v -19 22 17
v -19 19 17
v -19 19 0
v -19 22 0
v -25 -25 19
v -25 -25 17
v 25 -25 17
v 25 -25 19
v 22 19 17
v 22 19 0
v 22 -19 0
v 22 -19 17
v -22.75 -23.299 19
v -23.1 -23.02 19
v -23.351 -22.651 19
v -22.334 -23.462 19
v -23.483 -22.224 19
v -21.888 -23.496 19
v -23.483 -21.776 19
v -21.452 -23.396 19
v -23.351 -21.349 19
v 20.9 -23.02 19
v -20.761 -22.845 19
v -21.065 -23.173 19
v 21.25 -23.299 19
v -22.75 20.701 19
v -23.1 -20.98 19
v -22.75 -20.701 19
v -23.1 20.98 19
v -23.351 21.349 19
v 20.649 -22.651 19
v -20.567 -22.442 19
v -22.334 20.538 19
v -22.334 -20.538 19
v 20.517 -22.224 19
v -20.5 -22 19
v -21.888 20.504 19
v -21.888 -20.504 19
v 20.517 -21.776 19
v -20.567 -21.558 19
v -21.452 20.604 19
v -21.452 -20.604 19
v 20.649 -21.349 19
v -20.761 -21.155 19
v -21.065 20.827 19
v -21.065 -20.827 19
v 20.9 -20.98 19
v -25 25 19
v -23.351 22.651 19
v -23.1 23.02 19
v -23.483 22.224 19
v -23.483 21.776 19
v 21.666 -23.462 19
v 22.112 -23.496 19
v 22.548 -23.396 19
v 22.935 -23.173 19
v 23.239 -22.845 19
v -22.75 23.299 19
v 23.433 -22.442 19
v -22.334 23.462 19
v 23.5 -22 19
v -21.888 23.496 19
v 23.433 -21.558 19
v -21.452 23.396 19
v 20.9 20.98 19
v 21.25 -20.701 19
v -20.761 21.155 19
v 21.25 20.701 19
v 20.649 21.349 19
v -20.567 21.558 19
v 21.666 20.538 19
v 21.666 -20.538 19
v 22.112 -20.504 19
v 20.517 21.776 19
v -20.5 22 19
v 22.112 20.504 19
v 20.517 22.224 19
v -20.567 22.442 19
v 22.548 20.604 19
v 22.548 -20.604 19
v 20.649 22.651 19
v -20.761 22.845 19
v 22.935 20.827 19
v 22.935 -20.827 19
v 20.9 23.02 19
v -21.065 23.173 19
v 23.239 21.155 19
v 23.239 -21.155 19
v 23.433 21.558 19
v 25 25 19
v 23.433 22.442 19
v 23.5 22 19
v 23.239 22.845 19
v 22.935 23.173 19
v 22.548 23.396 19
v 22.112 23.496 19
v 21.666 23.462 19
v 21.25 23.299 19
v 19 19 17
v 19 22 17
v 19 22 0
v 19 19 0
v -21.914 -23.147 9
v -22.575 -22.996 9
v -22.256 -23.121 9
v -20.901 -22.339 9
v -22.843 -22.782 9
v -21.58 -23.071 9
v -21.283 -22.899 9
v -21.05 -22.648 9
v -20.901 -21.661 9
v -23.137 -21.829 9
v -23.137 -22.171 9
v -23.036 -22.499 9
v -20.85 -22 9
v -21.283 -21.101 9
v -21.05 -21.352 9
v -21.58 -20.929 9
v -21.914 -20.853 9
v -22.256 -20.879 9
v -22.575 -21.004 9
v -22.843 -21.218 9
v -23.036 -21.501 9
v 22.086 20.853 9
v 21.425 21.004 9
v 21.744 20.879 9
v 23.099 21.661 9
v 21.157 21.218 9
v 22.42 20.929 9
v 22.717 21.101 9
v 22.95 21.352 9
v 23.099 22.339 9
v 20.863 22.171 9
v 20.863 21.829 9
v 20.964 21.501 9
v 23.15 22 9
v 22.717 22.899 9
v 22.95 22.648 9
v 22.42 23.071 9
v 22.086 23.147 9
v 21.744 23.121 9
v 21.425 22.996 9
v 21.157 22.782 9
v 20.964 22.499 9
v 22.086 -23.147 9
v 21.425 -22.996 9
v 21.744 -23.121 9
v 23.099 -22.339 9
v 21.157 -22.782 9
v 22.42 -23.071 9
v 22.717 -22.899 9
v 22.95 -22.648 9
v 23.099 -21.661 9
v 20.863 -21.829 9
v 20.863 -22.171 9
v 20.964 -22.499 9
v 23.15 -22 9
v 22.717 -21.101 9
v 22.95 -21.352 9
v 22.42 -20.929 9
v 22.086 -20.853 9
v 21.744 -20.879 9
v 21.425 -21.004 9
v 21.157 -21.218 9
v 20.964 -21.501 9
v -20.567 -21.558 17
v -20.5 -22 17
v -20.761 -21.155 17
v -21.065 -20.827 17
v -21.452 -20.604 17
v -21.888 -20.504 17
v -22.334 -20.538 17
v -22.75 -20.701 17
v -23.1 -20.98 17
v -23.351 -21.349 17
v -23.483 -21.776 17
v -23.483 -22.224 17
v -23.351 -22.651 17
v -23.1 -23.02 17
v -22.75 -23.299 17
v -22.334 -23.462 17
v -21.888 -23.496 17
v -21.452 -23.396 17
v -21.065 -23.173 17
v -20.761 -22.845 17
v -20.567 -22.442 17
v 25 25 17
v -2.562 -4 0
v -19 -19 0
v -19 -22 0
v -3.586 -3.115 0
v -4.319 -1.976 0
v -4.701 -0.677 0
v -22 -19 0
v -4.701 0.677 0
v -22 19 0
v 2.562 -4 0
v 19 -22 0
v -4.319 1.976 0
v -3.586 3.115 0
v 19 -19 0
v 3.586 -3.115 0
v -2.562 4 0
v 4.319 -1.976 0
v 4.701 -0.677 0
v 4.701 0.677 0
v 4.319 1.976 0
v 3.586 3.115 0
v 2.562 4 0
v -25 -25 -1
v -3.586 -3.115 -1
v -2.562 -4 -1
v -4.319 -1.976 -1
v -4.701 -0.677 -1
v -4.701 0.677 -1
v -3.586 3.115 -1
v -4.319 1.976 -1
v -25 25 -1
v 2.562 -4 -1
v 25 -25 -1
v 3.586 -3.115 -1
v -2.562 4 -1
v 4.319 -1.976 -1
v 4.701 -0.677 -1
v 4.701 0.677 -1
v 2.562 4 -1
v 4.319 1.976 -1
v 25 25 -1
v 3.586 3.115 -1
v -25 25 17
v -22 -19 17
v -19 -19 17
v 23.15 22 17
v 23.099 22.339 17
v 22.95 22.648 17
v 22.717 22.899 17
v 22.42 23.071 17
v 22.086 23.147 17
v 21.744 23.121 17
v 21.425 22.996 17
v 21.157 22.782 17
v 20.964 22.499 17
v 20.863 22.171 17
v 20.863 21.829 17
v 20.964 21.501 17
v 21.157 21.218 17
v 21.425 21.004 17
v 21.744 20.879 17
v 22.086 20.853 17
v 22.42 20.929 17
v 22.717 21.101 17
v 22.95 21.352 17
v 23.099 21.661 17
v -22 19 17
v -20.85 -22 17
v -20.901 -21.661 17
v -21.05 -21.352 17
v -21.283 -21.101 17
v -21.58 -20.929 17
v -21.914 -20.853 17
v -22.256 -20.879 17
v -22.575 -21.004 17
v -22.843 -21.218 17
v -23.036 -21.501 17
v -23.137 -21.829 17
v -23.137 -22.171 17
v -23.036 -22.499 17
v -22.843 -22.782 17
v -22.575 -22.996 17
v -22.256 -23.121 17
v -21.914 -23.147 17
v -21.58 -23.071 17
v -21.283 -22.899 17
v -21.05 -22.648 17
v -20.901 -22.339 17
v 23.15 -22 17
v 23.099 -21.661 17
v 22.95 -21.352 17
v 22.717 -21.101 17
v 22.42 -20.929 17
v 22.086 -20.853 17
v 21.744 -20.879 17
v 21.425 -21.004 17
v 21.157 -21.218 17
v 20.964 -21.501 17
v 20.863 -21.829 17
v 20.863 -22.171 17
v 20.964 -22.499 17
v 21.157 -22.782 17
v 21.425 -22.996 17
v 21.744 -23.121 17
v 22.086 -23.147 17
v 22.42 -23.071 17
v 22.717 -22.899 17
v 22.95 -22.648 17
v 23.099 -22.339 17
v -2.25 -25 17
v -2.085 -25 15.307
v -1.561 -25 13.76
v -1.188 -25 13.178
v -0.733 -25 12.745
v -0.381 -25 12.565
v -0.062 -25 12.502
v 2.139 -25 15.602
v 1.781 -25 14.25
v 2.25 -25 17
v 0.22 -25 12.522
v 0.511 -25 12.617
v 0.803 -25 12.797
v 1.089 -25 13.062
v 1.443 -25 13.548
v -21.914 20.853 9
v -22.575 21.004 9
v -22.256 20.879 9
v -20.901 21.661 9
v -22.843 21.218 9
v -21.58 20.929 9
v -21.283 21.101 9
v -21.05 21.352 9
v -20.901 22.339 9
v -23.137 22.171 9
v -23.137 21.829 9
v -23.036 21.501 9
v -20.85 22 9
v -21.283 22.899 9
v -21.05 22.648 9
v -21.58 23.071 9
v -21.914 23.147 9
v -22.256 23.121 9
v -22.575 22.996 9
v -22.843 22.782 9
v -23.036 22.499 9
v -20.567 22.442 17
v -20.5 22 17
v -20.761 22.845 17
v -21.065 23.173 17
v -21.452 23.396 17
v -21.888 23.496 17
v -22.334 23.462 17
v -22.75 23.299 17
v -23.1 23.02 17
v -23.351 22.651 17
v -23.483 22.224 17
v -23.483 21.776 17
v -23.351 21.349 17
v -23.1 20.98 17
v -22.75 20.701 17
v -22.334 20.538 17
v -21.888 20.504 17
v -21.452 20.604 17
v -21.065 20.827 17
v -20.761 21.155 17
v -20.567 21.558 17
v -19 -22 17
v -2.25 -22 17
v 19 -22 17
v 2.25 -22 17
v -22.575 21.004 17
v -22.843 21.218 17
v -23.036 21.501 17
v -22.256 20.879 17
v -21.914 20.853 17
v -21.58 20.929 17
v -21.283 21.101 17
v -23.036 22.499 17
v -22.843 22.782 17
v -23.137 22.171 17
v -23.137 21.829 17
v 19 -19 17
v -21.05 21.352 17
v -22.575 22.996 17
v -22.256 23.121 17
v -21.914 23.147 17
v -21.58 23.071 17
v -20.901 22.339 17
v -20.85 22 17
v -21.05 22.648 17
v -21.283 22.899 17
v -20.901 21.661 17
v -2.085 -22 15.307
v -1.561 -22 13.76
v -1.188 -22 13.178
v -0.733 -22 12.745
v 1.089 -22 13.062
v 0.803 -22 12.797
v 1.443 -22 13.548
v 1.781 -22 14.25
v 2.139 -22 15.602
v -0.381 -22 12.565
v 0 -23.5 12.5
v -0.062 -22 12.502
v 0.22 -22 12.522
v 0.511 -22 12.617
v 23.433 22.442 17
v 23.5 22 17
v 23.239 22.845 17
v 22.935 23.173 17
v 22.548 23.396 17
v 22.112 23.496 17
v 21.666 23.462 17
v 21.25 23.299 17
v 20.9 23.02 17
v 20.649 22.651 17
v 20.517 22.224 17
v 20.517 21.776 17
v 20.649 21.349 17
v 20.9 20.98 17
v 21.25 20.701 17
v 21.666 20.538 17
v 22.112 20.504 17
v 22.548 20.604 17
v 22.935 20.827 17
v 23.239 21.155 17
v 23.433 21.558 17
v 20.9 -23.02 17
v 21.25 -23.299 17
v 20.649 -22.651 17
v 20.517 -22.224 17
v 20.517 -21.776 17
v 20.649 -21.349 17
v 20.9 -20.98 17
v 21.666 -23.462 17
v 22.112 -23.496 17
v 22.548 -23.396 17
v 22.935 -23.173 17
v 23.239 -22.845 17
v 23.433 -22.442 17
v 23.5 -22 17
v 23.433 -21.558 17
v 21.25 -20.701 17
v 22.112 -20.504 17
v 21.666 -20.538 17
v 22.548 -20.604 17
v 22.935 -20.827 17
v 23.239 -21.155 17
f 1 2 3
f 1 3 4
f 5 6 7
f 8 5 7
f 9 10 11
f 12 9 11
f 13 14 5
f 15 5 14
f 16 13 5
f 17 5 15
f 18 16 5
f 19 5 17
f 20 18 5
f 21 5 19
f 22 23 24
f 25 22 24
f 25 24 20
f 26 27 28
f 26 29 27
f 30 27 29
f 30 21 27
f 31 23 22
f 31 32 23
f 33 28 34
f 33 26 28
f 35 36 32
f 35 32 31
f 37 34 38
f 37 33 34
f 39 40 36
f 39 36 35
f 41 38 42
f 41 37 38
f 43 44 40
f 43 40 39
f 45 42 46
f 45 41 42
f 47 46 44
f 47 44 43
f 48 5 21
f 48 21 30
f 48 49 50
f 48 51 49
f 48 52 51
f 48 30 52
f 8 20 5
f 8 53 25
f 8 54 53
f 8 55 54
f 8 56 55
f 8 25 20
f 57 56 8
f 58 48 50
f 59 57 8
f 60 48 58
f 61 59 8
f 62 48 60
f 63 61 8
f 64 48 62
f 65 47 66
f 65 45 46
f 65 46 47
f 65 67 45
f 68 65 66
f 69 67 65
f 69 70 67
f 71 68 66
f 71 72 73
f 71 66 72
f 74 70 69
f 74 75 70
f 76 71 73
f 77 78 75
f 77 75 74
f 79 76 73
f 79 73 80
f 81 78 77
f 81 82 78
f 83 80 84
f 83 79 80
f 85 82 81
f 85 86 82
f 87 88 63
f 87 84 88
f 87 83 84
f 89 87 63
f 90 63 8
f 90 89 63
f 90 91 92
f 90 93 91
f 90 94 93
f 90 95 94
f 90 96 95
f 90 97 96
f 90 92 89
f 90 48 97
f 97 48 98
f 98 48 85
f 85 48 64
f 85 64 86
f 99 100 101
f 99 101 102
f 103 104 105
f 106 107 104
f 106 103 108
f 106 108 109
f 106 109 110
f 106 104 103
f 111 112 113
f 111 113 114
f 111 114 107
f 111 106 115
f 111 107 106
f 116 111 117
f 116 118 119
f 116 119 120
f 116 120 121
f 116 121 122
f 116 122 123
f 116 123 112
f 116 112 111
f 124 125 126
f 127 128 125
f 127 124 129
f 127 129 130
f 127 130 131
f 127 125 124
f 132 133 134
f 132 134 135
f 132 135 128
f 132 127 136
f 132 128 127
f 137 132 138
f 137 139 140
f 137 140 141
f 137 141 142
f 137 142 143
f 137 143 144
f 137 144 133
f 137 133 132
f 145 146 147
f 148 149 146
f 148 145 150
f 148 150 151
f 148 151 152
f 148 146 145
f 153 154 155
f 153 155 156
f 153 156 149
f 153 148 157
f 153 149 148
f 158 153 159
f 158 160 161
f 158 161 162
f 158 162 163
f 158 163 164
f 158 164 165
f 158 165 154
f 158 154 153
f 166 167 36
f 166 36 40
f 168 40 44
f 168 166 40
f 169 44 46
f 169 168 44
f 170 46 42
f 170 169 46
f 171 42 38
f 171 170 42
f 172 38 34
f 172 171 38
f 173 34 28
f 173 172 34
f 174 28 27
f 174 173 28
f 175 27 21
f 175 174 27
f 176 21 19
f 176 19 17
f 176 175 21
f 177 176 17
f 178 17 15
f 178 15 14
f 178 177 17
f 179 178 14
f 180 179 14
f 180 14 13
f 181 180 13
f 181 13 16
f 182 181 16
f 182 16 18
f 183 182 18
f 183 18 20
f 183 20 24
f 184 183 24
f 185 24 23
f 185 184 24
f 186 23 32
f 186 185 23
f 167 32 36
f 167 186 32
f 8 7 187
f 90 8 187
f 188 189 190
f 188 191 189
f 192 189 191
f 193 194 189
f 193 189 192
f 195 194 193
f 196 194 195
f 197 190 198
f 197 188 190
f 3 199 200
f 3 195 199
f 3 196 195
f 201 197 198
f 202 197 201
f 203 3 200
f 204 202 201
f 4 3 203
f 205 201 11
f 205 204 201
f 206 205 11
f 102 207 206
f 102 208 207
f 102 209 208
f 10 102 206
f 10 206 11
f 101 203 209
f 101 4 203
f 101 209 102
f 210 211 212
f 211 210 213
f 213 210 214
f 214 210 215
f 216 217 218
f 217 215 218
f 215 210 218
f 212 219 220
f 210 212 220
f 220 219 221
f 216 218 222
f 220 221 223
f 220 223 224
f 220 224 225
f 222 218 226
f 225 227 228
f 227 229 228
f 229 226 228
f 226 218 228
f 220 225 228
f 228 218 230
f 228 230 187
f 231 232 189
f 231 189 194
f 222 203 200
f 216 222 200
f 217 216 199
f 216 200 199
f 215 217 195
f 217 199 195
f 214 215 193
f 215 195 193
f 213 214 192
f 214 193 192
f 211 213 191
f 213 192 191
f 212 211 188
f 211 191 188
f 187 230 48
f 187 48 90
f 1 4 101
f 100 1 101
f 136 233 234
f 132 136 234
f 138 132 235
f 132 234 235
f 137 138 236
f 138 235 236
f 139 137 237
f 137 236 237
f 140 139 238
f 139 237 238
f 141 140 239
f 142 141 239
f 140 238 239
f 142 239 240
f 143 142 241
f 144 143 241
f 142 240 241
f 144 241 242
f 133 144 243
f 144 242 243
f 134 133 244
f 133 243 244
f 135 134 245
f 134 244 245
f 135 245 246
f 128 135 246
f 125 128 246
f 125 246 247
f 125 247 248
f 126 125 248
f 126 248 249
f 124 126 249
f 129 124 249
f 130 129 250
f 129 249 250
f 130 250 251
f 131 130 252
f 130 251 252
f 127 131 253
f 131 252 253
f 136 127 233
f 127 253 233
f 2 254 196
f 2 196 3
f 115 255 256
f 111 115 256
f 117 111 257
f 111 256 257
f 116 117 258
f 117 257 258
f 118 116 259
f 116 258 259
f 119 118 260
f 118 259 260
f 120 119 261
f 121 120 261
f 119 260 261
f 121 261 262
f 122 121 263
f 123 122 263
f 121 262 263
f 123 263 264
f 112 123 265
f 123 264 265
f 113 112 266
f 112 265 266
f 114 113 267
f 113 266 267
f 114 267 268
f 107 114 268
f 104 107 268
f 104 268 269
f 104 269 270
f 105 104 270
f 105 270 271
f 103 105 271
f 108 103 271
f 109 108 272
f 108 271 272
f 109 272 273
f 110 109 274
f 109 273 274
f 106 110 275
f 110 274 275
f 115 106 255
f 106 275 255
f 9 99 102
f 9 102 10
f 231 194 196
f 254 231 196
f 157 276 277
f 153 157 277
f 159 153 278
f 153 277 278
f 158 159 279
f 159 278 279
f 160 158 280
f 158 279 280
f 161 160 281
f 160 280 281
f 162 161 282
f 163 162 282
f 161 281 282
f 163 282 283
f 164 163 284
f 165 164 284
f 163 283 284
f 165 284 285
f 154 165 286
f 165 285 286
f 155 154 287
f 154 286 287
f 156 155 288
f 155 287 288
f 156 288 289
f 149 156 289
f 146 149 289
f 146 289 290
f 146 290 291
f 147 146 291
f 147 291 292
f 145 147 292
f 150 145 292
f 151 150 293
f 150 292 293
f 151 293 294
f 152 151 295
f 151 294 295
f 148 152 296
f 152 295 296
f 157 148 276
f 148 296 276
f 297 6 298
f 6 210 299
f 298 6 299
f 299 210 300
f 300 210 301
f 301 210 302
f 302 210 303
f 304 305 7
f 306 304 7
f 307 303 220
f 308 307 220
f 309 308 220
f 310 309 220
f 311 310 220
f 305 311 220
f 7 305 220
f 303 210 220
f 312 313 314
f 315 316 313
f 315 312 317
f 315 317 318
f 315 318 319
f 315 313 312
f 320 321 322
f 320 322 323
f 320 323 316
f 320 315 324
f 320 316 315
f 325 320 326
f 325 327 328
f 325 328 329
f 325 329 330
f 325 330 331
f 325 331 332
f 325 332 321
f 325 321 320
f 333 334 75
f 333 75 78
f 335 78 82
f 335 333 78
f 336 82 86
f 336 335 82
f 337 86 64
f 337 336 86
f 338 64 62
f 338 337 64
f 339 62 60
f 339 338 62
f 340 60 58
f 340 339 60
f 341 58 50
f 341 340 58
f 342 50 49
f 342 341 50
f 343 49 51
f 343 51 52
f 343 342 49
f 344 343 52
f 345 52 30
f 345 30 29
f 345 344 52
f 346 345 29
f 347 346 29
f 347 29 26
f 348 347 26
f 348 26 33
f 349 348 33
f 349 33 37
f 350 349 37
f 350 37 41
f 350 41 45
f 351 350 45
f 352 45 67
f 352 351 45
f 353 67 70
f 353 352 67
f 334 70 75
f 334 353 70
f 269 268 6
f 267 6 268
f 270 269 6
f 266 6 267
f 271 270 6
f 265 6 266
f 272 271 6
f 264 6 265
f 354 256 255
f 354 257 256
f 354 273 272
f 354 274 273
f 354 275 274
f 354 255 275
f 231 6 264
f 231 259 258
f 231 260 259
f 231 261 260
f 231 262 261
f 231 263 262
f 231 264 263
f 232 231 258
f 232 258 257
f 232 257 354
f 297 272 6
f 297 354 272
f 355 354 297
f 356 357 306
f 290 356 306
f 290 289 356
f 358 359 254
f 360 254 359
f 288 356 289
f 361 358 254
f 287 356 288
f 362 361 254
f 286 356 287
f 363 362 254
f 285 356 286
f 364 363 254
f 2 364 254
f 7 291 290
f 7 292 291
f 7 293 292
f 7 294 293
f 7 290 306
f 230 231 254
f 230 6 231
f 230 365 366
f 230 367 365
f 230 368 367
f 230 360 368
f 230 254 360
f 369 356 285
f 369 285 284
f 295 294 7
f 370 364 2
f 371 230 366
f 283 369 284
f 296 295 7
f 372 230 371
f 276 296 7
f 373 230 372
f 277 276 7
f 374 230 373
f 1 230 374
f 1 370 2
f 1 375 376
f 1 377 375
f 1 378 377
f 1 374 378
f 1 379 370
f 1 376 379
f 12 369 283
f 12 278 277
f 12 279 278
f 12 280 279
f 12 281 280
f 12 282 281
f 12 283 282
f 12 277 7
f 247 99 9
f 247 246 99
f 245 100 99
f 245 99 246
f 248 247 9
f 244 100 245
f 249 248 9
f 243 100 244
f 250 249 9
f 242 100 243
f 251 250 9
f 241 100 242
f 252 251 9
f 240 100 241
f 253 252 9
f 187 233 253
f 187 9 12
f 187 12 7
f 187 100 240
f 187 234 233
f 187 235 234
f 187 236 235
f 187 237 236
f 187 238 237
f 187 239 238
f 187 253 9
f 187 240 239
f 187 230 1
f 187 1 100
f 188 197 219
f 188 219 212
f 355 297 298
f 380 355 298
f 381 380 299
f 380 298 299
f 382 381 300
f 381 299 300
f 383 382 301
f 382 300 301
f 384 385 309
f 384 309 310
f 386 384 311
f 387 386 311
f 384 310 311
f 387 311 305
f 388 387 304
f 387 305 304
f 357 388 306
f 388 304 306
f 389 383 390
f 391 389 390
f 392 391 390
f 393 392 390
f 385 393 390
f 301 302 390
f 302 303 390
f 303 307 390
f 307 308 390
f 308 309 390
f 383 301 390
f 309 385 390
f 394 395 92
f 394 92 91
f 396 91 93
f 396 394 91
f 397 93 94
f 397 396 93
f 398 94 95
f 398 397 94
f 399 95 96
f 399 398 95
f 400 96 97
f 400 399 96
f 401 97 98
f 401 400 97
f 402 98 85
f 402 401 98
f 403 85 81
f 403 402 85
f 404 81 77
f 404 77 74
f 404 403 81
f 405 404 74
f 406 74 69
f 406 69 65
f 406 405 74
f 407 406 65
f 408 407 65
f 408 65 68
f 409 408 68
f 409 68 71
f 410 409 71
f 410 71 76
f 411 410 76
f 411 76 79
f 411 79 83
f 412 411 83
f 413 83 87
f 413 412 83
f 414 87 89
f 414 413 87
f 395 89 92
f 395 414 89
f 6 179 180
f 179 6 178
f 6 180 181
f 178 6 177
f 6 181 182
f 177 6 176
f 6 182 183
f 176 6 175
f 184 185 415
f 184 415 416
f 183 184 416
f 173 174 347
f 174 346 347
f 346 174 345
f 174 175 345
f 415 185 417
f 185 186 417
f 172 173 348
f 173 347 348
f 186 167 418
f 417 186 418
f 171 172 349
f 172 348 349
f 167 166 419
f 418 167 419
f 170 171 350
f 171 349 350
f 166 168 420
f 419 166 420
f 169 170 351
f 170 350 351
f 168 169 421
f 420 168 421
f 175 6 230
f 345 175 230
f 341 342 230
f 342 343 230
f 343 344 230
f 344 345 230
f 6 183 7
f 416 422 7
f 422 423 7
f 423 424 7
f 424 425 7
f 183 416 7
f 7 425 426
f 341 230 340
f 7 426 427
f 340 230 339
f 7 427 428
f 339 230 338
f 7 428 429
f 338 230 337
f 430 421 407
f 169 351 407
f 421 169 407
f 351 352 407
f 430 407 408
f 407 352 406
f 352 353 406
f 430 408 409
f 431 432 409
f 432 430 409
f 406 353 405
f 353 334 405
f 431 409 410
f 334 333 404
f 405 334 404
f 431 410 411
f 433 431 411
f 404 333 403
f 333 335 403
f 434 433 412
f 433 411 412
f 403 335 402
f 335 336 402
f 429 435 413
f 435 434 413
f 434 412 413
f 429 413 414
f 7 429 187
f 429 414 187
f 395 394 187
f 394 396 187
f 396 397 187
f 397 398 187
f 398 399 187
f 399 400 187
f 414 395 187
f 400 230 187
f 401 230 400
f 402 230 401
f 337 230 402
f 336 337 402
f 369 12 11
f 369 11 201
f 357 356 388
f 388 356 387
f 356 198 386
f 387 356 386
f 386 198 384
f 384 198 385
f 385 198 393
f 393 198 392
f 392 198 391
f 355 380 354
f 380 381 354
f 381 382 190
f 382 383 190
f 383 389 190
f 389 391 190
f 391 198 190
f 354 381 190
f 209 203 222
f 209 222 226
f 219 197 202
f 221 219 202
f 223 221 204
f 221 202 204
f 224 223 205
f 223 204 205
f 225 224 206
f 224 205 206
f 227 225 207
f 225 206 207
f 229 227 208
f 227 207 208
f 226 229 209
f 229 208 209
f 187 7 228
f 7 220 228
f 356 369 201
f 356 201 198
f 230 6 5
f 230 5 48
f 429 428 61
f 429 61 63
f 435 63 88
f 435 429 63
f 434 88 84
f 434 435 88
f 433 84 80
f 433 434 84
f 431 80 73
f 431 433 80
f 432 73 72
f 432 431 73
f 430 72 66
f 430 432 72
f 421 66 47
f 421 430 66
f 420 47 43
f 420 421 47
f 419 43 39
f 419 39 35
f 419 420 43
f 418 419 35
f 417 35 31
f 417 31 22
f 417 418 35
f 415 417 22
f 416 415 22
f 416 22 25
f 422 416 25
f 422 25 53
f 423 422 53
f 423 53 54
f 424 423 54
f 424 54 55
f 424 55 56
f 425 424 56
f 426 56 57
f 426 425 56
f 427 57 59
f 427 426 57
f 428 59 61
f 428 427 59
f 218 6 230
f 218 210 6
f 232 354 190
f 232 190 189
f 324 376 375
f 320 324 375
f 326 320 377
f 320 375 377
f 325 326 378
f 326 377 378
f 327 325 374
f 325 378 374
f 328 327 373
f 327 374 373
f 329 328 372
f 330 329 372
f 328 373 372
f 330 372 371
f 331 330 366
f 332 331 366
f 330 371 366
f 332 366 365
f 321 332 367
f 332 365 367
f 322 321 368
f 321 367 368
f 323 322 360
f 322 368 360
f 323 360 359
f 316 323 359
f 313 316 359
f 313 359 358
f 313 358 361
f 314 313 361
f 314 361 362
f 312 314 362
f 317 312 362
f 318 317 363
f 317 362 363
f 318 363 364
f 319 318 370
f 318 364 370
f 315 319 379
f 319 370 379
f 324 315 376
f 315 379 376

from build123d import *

# Parameters (mm, degrees)
SKETCH_W        = 50
SKETCH_H        = 50
PAD_DEPTH       = 1
SKETCH001_W     = 50
SKETCH001_H     = 50
PAD001_DEPTH    = 17
SKETCH002_R     = 1.15
POCKET_DEPTH    = 8
POCKET001_DEPTH = 3
SKETCH004_W     = 50
SKETCH004_H     = 50
SKETCH004_R     = 1.5
PAD002_DEPTH    = 2


with BuildPart() as main_box:
    # Sketch → Pad (new body)
    with BuildSketch(Plane.XY):
        Rectangle(SKETCH_W, SKETCH_H)
        with BuildLine():
            ThreePointArc((-2.561738, 4), (-4.75, 0), (-2.561738, -4))
            Line((2.561738, -4), (-2.561738, -4))
            ThreePointArc((2.561738, -4), (4.75, 0), (2.561738, 4))
            Line((-2.561738, 4), (2.561738, 4))
        make_face(mode=Mode.SUBTRACT)
    extrude(amount=-PAD_DEPTH)

    # Sketch001 → Pad001 (join)
    with BuildSketch(Plane.XY):
        Rectangle(SKETCH001_W, SKETCH001_H)
        Polygon((-19, 22), (19, 22), (19, 19), (22, 19), (22, -19), (19, -19), (19, -22), (-19, -22), (-19, -19), (-22, -19), (-22, 19), (-19, 19), align=None, mode=Mode.SUBTRACT)
    extrude(amount=PAD001_DEPTH)

    # Sketch002 (on Face9 of Pad001) → Pocket (cut)
    with BuildSketch(Plane.XY.offset(17)):
        with Locations((-22, 22)):
            Circle(SKETCH002_R)
        with Locations((22, 22)):
            Circle(SKETCH002_R)
        with Locations((-22, -22)):
            Circle(SKETCH002_R)
        with Locations((22, -22)):
            Circle(SKETCH002_R)
    extrude(amount=-POCKET_DEPTH, mode=Mode.SUBTRACT)

    # Sketch003 (on Face14 of Pocket) → Pocket001 (cut)
    with BuildSketch(Plane.XZ.offset(25)):
        with BuildLine():
            add(Edge.make_bspline(
                [(-2.25, 17), (-2.25, 12.5), (0, 12.5), (2.25, 12.5), (2.25, 17)],
                knots=[4.712389, 4.712389, 4.712389, 6.283185, 6.283185, 7.853982, 7.853982, 7.853982], degree=2, weights=[1, 0.707107, 1, 0.707107, 1]))
            Line((2.25, 17), (-2.25, 17))
        make_face()
    extrude(amount=-POCKET001_DEPTH, mode=Mode.SUBTRACT)


with BuildPart() as cover:
    # Sketch004 → Pad002 (new body)
    with BuildSketch(Plane.XY.offset(17)):
        Rectangle(SKETCH004_W, SKETCH004_H)
        with Locations((-22, 22)):
            Circle(SKETCH004_R, mode=Mode.SUBTRACT)
        with Locations((22, 22)):
            Circle(SKETCH004_R, mode=Mode.SUBTRACT)
        with Locations((22, -22)):
            Circle(SKETCH004_R, mode=Mode.SUBTRACT)
        with Locations((-22, -22)):
            Circle(SKETCH004_R, mode=Mode.SUBTRACT)
    extrude(amount=PAD002_DEPTH)


solid = Compound([main_box.part, cover.part])
